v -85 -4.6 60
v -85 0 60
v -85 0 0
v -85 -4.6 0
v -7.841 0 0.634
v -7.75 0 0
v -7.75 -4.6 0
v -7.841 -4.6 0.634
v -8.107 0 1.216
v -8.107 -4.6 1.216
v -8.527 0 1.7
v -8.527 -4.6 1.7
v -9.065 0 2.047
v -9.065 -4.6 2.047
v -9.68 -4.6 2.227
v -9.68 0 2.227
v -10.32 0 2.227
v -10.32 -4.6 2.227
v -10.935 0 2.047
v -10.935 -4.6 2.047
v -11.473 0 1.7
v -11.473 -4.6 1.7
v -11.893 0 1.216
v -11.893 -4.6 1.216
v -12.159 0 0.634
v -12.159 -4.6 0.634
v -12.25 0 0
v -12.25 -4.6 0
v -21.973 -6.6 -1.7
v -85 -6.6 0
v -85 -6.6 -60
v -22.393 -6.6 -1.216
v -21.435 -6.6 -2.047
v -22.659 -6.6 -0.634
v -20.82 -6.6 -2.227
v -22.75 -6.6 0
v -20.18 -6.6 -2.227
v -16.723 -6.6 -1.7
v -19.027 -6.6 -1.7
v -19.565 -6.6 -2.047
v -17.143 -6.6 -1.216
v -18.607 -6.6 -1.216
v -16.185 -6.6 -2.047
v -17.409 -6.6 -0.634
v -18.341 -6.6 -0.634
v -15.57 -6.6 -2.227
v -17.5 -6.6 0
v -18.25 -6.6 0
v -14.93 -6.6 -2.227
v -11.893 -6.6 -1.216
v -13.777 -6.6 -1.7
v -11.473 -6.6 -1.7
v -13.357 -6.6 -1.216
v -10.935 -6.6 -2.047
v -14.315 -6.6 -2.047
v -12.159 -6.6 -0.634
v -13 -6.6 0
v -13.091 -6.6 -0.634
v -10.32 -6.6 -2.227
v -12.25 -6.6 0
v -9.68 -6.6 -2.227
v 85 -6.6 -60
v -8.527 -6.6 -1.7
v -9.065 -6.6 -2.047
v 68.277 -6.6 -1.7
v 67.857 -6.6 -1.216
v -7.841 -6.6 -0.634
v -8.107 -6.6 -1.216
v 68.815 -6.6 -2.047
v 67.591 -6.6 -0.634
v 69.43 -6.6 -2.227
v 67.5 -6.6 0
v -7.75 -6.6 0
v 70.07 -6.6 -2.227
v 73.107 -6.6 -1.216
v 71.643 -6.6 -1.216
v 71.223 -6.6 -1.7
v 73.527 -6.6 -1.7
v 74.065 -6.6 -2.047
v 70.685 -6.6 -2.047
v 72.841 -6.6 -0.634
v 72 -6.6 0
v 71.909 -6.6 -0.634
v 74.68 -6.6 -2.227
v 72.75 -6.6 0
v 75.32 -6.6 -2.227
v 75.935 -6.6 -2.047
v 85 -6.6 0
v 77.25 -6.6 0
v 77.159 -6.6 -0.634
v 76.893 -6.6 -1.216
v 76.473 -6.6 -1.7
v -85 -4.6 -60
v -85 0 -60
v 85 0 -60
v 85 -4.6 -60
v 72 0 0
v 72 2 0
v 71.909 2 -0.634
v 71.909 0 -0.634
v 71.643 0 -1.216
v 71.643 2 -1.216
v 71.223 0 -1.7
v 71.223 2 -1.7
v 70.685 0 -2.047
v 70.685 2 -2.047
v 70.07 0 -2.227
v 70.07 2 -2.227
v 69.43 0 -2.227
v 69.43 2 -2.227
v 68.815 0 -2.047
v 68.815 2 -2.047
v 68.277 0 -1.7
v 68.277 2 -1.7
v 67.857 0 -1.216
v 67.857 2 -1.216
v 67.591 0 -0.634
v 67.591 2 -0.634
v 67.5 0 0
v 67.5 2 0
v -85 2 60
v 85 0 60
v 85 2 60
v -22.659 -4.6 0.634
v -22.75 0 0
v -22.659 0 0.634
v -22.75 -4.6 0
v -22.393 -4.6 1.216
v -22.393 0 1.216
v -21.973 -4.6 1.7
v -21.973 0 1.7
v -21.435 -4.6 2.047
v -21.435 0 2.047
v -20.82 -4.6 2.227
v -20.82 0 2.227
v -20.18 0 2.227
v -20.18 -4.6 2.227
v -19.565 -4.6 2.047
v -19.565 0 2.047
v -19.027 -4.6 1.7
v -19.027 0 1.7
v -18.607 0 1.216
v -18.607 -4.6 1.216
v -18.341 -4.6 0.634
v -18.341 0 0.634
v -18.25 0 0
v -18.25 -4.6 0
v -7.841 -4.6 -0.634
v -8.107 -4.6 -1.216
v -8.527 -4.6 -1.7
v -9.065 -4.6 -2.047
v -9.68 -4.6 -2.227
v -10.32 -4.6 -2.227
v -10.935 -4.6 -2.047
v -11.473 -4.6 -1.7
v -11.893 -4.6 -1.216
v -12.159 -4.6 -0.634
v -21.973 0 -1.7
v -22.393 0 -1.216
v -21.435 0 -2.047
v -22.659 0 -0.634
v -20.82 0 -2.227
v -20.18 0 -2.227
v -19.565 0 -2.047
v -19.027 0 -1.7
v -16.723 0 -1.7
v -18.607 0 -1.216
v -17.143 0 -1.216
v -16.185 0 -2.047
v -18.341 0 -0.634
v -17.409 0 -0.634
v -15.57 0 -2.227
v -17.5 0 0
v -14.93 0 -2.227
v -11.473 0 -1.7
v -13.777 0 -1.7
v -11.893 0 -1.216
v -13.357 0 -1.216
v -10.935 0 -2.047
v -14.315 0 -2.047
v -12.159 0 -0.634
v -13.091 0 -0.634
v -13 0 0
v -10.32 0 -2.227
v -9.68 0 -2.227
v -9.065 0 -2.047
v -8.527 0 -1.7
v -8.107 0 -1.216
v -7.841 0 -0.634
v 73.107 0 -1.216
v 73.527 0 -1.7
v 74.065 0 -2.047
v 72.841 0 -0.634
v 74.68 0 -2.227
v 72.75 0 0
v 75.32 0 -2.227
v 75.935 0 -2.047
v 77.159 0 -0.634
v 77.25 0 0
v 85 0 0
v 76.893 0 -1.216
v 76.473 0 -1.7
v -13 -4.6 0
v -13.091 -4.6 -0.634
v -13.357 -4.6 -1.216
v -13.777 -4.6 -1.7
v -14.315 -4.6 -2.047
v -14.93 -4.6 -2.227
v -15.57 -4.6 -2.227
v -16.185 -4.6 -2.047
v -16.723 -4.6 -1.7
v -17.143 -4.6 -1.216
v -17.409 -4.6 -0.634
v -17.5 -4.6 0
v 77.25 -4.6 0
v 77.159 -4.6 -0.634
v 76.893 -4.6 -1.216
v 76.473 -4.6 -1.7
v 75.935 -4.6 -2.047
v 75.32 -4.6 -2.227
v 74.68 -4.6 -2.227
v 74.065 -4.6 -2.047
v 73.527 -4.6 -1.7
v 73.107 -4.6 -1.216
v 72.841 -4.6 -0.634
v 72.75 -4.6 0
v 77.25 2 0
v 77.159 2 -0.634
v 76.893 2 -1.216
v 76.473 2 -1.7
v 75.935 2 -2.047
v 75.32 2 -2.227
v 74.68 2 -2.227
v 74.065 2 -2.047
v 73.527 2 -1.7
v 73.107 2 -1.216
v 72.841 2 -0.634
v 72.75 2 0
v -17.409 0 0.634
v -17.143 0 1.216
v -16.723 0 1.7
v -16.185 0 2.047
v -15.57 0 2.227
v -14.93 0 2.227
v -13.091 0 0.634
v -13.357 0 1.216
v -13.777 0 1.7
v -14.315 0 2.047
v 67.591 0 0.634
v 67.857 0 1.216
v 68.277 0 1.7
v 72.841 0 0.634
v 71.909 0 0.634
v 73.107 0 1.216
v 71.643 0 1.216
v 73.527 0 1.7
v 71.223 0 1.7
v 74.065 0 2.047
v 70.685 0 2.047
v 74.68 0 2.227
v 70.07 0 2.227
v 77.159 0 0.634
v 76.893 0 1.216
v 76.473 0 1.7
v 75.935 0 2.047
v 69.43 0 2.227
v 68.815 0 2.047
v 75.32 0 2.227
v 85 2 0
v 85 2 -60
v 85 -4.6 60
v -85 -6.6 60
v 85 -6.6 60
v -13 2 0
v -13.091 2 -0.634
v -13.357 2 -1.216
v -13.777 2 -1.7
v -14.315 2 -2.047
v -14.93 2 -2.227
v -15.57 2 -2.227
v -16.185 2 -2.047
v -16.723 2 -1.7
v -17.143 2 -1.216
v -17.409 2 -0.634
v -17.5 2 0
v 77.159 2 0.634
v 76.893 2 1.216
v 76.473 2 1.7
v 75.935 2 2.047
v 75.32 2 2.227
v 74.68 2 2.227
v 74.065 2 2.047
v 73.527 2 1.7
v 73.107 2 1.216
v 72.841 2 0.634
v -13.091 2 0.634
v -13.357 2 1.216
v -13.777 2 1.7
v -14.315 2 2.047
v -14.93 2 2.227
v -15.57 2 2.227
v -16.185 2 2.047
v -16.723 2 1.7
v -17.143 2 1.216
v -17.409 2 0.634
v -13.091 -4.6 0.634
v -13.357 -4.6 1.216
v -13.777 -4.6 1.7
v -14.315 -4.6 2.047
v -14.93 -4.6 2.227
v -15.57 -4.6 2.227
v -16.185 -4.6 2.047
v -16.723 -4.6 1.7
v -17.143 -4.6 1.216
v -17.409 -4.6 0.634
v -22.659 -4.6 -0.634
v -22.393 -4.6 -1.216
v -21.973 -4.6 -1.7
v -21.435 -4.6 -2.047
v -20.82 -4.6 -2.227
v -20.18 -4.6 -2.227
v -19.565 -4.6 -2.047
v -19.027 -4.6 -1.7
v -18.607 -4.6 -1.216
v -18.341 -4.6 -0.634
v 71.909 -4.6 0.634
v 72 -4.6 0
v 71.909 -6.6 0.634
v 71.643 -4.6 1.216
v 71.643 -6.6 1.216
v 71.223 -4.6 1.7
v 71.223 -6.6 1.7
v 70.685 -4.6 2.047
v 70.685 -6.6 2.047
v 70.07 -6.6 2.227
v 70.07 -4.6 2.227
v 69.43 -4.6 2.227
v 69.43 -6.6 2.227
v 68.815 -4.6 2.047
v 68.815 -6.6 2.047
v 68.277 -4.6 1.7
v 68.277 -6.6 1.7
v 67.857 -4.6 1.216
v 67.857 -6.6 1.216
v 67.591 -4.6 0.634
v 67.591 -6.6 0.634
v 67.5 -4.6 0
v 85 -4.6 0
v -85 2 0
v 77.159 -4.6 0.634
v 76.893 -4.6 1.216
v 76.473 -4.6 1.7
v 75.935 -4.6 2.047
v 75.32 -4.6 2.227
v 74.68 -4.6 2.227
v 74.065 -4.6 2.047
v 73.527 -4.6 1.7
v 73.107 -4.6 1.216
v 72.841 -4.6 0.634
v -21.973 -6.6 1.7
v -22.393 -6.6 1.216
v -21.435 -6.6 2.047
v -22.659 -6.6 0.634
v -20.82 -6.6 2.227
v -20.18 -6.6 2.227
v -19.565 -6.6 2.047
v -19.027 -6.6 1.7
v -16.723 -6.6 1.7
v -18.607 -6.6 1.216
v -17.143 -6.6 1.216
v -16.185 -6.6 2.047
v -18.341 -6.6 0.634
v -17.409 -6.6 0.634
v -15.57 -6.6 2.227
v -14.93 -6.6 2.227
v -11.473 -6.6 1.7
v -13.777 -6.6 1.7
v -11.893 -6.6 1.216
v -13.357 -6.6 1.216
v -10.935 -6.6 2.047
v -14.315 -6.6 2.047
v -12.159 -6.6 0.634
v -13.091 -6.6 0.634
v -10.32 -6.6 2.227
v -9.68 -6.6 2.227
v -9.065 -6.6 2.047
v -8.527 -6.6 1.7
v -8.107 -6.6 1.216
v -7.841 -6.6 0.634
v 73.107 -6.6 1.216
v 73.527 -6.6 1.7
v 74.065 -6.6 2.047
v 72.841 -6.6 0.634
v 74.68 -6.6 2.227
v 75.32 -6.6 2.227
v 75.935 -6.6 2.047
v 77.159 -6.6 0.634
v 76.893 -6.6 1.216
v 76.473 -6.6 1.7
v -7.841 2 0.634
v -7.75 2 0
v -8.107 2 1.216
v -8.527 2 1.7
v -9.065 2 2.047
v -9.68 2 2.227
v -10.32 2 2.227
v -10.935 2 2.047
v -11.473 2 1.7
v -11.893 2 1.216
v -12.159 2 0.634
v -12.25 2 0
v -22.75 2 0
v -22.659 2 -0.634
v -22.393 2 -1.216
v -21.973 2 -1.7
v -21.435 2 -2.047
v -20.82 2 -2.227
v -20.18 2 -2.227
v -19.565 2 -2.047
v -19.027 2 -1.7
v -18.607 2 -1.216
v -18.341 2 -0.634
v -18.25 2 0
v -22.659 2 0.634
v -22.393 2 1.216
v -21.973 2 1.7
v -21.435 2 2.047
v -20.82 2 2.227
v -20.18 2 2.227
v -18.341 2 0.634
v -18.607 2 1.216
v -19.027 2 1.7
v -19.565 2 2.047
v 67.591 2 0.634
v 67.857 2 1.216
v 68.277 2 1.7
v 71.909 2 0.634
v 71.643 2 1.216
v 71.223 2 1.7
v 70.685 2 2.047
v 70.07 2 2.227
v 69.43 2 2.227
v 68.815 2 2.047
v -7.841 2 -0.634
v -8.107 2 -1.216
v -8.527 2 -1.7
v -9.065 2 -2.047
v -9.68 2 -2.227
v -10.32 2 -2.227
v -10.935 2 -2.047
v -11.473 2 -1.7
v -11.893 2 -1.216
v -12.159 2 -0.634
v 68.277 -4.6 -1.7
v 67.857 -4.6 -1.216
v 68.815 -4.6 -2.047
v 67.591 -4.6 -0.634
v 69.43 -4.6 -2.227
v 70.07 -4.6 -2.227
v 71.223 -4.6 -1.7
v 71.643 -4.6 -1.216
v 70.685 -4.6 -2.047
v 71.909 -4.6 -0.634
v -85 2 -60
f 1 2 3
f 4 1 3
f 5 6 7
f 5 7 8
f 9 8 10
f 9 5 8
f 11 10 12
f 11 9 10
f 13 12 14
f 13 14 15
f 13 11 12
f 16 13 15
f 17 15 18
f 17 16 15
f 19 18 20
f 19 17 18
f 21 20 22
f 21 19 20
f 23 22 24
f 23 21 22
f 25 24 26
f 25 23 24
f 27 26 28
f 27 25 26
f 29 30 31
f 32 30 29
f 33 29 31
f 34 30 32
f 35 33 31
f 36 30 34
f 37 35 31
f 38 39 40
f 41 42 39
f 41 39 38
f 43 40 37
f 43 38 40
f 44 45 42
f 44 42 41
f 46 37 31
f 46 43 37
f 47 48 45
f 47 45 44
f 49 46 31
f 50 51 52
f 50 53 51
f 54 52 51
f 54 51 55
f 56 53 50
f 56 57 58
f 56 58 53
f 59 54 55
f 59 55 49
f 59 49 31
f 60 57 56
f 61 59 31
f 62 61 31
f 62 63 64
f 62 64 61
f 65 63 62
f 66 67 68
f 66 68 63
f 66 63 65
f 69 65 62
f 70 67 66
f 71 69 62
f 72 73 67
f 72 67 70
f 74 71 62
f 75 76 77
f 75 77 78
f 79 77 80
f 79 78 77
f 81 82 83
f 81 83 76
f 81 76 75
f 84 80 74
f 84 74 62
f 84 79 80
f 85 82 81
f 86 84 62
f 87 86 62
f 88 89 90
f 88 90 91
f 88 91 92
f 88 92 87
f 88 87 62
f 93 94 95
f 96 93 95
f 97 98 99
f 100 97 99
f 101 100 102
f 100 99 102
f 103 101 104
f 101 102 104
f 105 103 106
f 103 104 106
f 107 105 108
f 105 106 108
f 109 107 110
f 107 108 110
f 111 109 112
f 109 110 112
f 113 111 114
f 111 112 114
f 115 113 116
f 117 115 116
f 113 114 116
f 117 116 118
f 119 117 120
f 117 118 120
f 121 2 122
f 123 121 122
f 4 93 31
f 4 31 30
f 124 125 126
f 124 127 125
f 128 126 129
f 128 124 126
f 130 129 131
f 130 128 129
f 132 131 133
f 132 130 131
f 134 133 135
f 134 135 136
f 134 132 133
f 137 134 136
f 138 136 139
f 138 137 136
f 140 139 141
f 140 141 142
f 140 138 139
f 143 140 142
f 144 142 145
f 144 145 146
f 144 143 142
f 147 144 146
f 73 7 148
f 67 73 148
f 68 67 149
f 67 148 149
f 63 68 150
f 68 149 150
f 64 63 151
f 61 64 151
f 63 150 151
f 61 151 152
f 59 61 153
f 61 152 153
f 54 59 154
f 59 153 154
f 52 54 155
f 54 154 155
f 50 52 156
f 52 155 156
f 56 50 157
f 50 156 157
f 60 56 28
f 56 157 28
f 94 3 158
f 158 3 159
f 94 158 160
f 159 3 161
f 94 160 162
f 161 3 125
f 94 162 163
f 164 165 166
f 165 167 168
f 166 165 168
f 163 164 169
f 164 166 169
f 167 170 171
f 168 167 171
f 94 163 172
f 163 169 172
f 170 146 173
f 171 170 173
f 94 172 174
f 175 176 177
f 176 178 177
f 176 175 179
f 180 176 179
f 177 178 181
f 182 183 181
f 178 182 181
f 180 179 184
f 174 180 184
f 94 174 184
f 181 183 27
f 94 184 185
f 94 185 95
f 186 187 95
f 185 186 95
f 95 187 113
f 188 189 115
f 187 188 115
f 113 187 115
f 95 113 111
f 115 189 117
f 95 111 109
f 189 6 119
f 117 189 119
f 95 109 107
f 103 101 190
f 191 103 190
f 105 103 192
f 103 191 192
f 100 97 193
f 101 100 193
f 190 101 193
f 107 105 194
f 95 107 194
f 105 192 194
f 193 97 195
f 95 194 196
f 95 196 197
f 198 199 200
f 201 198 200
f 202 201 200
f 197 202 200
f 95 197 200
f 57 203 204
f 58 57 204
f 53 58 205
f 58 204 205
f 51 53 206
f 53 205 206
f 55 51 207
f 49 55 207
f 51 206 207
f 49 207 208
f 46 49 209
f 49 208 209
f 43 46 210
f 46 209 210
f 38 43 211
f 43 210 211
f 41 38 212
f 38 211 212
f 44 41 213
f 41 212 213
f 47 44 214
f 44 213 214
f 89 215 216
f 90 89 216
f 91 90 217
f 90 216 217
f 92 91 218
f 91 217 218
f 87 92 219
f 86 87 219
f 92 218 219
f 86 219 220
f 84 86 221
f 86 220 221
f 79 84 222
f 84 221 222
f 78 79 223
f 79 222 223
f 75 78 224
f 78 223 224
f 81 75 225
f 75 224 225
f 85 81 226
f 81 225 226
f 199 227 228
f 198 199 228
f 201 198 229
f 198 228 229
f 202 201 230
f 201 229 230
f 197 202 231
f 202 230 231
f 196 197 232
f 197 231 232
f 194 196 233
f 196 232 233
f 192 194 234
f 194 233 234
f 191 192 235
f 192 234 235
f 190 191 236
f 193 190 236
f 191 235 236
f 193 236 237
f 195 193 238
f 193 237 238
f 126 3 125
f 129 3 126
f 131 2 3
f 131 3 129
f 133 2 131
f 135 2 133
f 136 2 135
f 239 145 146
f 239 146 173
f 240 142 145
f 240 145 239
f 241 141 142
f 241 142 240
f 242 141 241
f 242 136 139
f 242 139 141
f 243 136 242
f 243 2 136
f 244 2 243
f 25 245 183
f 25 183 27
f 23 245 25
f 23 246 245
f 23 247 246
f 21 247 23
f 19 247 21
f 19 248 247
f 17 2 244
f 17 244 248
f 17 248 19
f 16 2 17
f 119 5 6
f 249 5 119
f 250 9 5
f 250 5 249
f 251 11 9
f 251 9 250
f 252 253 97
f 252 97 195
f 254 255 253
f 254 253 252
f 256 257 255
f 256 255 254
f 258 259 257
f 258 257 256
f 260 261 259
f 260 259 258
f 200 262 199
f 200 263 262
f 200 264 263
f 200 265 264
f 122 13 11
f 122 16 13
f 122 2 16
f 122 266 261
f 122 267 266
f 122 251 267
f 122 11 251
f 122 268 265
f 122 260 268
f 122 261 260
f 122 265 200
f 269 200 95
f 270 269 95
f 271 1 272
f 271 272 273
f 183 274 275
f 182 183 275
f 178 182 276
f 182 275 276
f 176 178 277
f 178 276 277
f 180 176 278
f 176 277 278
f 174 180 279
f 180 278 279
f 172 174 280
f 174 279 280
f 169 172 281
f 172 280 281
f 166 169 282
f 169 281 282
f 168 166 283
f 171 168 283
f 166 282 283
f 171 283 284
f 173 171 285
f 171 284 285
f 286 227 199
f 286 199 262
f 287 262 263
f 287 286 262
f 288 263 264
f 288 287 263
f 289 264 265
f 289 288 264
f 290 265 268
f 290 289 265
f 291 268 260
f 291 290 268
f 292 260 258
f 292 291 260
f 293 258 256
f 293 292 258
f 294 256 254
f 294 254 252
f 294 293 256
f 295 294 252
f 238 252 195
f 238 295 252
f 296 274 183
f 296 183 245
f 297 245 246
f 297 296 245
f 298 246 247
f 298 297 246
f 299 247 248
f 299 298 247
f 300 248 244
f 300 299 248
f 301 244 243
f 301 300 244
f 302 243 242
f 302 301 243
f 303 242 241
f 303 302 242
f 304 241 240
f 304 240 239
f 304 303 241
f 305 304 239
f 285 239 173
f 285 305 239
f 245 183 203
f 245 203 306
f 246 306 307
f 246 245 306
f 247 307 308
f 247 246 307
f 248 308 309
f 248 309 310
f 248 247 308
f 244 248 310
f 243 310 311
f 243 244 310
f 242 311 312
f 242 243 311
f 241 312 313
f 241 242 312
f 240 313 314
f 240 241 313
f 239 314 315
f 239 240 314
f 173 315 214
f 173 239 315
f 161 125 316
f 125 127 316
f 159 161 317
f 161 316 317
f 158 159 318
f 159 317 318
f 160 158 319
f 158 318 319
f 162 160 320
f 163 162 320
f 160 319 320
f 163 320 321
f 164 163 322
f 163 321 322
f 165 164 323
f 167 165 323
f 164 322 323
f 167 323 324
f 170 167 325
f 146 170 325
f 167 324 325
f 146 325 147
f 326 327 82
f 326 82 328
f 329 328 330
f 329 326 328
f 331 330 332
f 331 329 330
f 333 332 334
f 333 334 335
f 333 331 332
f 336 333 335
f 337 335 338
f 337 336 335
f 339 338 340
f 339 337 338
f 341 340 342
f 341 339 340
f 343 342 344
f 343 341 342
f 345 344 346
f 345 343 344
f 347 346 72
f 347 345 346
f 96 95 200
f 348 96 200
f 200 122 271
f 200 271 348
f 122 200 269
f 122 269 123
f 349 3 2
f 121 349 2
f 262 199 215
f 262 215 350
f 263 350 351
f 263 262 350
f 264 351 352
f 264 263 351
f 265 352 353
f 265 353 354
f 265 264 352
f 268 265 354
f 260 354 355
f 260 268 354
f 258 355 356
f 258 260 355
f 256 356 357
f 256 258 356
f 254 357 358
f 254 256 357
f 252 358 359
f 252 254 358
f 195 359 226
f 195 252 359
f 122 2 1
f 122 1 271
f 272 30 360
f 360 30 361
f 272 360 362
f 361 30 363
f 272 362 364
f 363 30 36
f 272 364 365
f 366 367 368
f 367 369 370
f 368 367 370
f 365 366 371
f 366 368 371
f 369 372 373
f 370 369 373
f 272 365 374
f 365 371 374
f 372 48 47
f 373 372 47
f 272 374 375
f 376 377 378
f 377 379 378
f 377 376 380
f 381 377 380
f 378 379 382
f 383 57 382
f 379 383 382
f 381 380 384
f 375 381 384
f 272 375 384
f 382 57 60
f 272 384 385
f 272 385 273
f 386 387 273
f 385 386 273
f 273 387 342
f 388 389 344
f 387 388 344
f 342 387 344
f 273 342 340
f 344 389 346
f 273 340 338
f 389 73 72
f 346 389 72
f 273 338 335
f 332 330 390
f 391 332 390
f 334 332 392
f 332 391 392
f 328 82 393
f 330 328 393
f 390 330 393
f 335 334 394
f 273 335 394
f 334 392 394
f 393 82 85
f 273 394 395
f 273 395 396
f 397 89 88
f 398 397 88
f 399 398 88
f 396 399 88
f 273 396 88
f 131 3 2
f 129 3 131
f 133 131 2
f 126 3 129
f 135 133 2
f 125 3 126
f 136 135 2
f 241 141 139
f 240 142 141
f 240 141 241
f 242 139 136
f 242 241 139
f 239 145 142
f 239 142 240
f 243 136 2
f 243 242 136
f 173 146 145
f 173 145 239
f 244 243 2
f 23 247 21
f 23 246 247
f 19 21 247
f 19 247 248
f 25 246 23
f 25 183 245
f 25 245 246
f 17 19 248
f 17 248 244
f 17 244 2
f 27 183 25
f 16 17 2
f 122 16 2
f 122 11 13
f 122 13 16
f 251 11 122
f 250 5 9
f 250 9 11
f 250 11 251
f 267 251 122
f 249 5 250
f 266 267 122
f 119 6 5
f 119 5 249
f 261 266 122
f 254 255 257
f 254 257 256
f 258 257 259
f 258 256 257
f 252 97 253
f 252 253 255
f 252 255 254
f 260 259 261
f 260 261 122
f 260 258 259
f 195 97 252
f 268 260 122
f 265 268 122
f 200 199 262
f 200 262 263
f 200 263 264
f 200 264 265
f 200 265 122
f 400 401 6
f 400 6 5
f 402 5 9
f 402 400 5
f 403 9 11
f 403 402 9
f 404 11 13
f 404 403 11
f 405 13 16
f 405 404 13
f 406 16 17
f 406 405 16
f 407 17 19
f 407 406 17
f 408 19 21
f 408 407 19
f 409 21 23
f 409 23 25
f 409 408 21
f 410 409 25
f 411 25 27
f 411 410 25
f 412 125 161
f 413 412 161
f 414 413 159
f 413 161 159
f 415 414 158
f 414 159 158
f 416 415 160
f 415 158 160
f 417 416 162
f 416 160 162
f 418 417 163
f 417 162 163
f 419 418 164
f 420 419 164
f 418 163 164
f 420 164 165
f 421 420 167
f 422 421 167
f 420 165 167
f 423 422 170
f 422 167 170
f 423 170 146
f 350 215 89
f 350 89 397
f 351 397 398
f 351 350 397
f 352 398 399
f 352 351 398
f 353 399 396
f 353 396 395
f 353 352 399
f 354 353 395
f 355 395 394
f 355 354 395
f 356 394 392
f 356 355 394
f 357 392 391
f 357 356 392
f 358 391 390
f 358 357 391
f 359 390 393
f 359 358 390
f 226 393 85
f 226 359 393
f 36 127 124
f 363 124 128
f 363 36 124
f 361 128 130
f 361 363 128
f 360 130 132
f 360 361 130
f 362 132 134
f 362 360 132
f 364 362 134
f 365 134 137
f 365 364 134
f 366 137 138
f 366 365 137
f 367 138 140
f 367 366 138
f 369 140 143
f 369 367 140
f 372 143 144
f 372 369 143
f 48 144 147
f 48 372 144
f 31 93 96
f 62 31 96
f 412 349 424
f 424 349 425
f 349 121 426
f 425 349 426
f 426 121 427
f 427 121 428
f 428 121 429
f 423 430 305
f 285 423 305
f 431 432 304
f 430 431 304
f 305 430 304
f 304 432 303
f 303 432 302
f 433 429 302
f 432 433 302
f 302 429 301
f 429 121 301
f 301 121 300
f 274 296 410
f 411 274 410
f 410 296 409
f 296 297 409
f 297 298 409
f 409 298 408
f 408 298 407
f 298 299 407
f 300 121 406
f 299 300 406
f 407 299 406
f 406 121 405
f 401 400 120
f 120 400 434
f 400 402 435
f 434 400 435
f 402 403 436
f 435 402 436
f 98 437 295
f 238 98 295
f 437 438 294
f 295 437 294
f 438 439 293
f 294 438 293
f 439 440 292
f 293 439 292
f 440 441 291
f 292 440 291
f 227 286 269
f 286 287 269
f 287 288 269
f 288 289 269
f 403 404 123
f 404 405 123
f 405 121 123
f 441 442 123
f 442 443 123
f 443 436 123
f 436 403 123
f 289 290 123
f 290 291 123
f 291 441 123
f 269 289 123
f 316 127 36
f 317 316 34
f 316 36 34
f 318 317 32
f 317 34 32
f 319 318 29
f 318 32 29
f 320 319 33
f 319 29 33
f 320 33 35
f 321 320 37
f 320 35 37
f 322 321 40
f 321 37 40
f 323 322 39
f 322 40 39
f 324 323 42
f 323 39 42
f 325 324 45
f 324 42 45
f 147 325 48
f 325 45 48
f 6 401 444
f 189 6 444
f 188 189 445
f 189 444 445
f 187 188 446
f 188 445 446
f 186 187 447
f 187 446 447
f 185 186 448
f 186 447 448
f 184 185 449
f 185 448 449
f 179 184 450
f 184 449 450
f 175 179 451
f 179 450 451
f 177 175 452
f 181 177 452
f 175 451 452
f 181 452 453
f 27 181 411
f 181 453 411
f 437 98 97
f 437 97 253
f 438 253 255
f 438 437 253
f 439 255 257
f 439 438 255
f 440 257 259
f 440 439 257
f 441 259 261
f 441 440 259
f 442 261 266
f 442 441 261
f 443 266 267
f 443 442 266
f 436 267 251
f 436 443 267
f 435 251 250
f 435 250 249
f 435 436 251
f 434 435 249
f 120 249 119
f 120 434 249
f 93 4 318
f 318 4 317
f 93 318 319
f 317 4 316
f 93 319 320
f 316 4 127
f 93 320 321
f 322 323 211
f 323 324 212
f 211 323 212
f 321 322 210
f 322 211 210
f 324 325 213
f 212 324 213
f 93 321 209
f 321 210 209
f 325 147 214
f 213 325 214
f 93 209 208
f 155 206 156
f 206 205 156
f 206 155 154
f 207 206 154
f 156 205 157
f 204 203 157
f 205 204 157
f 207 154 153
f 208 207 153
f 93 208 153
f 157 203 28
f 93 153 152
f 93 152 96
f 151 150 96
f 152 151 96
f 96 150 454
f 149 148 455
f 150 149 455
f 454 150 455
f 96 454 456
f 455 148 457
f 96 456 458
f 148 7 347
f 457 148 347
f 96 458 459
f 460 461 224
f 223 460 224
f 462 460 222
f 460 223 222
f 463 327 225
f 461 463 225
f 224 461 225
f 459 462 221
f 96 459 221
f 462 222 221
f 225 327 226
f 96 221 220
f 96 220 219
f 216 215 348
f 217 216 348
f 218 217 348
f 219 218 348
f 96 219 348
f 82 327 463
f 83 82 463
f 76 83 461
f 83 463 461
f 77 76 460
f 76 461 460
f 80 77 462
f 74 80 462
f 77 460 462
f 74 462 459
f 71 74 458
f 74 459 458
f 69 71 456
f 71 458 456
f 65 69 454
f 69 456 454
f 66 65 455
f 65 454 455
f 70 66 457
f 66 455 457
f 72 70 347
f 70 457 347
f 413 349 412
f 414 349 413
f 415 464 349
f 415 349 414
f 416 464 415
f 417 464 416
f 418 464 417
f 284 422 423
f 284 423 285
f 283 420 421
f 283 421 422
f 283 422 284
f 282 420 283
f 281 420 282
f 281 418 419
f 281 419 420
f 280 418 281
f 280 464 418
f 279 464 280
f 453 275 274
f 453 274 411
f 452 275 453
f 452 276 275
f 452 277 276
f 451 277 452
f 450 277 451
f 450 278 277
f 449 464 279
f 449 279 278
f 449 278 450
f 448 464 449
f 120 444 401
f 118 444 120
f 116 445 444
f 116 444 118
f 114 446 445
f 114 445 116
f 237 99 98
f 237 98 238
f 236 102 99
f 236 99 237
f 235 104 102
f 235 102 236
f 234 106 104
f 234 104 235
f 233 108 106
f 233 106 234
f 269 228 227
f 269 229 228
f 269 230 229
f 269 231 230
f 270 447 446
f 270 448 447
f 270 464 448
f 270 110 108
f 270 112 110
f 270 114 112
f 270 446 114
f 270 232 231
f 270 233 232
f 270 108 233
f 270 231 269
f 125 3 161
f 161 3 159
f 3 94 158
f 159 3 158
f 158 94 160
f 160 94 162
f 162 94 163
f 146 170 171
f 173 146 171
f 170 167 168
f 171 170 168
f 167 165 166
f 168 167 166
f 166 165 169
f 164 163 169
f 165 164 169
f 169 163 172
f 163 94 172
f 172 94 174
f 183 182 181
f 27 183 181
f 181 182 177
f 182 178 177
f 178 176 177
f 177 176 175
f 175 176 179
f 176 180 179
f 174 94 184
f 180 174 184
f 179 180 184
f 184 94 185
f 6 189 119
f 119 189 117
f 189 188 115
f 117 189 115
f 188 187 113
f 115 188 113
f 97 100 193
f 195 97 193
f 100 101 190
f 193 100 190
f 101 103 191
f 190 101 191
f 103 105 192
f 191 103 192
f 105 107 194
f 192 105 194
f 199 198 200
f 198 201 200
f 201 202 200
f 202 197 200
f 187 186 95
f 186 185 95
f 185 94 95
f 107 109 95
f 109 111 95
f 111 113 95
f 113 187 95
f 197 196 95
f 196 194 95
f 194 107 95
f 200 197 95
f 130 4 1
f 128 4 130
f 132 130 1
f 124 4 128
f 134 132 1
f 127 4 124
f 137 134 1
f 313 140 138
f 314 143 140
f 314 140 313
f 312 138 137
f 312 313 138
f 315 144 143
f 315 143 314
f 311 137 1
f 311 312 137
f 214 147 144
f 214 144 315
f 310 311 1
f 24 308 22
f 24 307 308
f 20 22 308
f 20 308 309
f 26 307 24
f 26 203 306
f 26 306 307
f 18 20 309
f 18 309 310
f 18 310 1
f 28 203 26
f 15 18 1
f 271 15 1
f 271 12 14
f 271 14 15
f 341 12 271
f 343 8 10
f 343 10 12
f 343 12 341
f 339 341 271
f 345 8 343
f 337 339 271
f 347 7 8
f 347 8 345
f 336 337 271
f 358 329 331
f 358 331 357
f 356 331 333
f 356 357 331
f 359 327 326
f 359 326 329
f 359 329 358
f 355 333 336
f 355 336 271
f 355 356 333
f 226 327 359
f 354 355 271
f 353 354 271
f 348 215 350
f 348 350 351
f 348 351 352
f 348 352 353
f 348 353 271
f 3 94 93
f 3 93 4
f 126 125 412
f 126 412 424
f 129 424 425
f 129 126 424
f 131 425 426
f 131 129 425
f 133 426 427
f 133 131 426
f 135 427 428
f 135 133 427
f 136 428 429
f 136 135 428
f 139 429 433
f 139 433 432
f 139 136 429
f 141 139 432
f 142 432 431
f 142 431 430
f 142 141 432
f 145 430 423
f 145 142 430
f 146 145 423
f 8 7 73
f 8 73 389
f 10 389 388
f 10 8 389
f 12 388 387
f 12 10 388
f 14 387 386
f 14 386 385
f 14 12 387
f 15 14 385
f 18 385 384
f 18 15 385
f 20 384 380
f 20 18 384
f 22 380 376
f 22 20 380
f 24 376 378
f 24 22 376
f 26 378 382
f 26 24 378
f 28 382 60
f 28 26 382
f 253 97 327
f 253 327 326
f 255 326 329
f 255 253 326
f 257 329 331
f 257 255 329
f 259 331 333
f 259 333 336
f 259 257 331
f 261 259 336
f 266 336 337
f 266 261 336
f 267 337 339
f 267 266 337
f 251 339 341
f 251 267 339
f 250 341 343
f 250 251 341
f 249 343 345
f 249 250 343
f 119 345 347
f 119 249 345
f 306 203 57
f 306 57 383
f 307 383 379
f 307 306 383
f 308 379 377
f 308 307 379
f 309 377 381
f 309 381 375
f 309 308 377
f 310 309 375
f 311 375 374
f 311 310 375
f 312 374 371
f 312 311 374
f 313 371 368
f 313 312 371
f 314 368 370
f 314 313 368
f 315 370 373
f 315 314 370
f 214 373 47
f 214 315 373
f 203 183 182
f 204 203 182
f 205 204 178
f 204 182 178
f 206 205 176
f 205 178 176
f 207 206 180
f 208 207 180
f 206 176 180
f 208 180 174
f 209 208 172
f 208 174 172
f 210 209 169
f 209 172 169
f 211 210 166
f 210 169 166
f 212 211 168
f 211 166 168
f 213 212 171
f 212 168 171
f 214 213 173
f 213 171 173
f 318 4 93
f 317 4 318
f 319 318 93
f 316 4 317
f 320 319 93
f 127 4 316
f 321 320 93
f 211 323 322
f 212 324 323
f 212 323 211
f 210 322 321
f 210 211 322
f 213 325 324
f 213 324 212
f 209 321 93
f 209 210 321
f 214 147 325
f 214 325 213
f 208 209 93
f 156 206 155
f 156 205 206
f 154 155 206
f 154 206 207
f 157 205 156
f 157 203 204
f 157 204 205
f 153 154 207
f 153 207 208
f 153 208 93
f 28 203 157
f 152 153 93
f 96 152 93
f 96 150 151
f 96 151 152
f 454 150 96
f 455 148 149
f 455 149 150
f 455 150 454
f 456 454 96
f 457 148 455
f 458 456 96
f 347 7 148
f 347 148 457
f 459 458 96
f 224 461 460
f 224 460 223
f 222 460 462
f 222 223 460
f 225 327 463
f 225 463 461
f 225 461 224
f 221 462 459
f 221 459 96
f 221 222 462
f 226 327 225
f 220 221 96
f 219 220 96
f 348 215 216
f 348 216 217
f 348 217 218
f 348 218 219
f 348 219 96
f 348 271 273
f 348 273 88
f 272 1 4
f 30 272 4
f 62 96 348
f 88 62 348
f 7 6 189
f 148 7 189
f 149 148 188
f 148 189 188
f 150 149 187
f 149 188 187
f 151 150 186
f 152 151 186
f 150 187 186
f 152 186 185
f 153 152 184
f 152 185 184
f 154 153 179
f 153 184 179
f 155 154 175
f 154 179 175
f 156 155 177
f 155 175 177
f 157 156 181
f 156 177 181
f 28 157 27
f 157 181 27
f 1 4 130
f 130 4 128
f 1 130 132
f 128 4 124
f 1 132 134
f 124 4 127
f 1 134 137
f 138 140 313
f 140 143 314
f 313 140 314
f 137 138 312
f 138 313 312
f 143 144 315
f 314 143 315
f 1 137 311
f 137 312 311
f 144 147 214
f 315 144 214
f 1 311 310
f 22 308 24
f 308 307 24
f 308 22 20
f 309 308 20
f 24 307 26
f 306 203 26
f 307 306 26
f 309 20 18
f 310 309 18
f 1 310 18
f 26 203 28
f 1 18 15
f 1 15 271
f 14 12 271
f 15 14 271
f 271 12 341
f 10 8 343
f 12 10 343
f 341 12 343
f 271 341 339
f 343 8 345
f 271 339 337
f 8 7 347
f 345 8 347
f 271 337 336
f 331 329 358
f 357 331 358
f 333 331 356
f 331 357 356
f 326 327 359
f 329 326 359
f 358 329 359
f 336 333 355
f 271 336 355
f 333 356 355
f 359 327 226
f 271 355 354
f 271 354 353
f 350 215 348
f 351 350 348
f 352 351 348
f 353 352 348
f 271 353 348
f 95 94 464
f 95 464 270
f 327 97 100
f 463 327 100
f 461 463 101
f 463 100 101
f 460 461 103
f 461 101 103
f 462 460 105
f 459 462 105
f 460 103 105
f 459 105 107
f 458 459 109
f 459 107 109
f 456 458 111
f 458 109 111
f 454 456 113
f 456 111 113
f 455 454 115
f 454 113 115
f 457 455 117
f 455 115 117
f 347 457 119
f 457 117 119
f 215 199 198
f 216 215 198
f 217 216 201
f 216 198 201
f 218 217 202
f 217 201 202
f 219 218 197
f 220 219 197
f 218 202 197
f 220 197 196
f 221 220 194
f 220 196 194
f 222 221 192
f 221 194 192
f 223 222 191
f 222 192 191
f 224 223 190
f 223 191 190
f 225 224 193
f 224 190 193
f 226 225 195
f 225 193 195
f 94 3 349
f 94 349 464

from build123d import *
from build123d.topology import SkipClean

# Parameters (mm, degrees)
SKETCH1_W           = 170
SKETCH1_H           = 60
BOSS_EXTRUDE1_DEPTH = 2
SKETCH2_W           = 170
SKETCH2_H           = 60
BOSS_EXTRUDE2_DEPTH = 4.6
SKETCH3_W           = 170
SKETCH3_H           = 60
BOSS_EXTRUDE3_DEPTH = 2
SKETCH4_R           = 2.25
CUT_EXTRUDE1_DEPTH  = 105.398084274
SKETCH8_W           = 2.25
SKETCH8_H           = 8.6


with BuildPart() as part:
    # Sketch1 → Boss-Extrude1 (new body)
    with BuildSketch(Plane(origin=(0, 0, 0), x_dir=(1, 0, 0), z_dir=(0, 1, 0))):
        with Locations((0, 30)):
            Rectangle(SKETCH1_W, SKETCH1_H)
    extrude(amount=BOSS_EXTRUDE1_DEPTH)


with BuildPart() as body_2:
    # Sketch2 → Boss-Extrude2 (new body)
    with BuildSketch(Plane.XZ):
        with Locations((0, -30)):
            Rectangle(SKETCH2_W, SKETCH2_H)
    extrude(amount=BOSS_EXTRUDE2_DEPTH)


with BuildPart() as body_3:
    # Sketch3 → Boss-Extrude3 (new body)
    with BuildSketch(Plane.XZ.offset(4.6)):
        with Locations((0, -30)):
            Rectangle(SKETCH3_W, SKETCH3_H)
    extrude(amount=BOSS_EXTRUDE3_DEPTH)


with BuildPart() as cut_extrude1_tool:
    # Sketch4 → Cut-Extrude1 (new, through all)
    with BuildSketch(Plane(origin=(0, 2, 0), x_dir=(1, 0, 0), z_dir=(0, 1, 0))):
        with Locations((75, 0)):
            Circle(SKETCH4_R)
        with Locations((-10, 0)):
            Circle(SKETCH4_R)
        with Locations((69.75, 0)):
            Circle(SKETCH4_R)
        with Locations((-15.25, 0)):
            Circle(SKETCH4_R)
    extrude(amount=-CUT_EXTRUDE1_DEPTH)


with BuildPart() as part_1:
    add(part.part)

    # Cut-Extrude1: cut by cut_extrude1_tool
    add(cut_extrude1_tool.part, mode=Mode.SUBTRACT)


with BuildPart() as body_2_1:
    add(body_2.part)

    # Cut-Extrude1: cut by cut_extrude1_tool
    add(cut_extrude1_tool.part, mode=Mode.SUBTRACT)


with BuildPart() as body_3_1:
    add(body_3.part)

    # Cut-Extrude1: cut by cut_extrude1_tool
    add(cut_extrude1_tool.part, mode=Mode.SUBTRACT)


with BuildPart() as f_4_5_4_5_diameter_hole1_tool:
    # Sketch8 → Ø4.5 (4.5) Diameter Hole1 (revolve)
    with BuildSketch(Plane(origin=(-20.5, 2, 0), x_dir=(0, 0, 1), z_dir=(1, 0, 0))):
        with Locations((1.125, 4.3)):
            Rectangle(SKETCH8_W, SKETCH8_H)
    revolve(axis=Axis((-20.5, 8.35, 0), (0, -1, 0)))


with BuildPart() as part_2:
    add(part_1.part)

    # Ø4.5 (4.5) Diameter Hole1: cut by f_4_5_4_5_diameter_hole1_tool
    add(f_4_5_4_5_diameter_hole1_tool.part, mode=Mode.SUBTRACT)

    # Mirror1: part across plane


with BuildPart() as body_2_2:
    add(body_2_1.part)

    # Ø4.5 (4.5) Diameter Hole1: cut by f_4_5_4_5_diameter_hole1_tool
    add(f_4_5_4_5_diameter_hole1_tool.part, mode=Mode.SUBTRACT)

    # Mirror1 2: body 2 across plane


with BuildPart() as body_3_2:
    add(body_3_1.part)

    # Ø4.5 (4.5) Diameter Hole1: cut by f_4_5_4_5_diameter_hole1_tool
    add(f_4_5_4_5_diameter_hole1_tool.part, mode=Mode.SUBTRACT)

    # Mirror1 3: body 3 across plane


with BuildPart() as part_3:
    with SkipClean():  # the faces are left unmerged after this step: merging them gives an invalid solid
        add(part_2.part)
        add(part_2.part.mirror(Plane(origin=(85, -4.6, 0), x_dir=(1, 0, 0), z_dir=(0, 0, -1))))


with BuildPart() as body_2_3:
    with SkipClean():  # the faces are left unmerged after this step: merging them gives an invalid solid
        add(body_2_2.part)
        add(body_2_2.part.mirror(Plane(origin=(85, -4.6, 0), x_dir=(1, 0, 0), z_dir=(0, 0, -1))))


with BuildPart() as body_3_3:
    with SkipClean():  # the faces are left unmerged after this step: merging them gives an invalid solid
        add(body_3_2.part)
        add(body_3_2.part.mirror(Plane(origin=(85, -4.6, 0), x_dir=(1, 0, 0), z_dir=(0, 0, -1))))


solid = Compound([part_3.part, body_2_3.part, body_3_3.part])
